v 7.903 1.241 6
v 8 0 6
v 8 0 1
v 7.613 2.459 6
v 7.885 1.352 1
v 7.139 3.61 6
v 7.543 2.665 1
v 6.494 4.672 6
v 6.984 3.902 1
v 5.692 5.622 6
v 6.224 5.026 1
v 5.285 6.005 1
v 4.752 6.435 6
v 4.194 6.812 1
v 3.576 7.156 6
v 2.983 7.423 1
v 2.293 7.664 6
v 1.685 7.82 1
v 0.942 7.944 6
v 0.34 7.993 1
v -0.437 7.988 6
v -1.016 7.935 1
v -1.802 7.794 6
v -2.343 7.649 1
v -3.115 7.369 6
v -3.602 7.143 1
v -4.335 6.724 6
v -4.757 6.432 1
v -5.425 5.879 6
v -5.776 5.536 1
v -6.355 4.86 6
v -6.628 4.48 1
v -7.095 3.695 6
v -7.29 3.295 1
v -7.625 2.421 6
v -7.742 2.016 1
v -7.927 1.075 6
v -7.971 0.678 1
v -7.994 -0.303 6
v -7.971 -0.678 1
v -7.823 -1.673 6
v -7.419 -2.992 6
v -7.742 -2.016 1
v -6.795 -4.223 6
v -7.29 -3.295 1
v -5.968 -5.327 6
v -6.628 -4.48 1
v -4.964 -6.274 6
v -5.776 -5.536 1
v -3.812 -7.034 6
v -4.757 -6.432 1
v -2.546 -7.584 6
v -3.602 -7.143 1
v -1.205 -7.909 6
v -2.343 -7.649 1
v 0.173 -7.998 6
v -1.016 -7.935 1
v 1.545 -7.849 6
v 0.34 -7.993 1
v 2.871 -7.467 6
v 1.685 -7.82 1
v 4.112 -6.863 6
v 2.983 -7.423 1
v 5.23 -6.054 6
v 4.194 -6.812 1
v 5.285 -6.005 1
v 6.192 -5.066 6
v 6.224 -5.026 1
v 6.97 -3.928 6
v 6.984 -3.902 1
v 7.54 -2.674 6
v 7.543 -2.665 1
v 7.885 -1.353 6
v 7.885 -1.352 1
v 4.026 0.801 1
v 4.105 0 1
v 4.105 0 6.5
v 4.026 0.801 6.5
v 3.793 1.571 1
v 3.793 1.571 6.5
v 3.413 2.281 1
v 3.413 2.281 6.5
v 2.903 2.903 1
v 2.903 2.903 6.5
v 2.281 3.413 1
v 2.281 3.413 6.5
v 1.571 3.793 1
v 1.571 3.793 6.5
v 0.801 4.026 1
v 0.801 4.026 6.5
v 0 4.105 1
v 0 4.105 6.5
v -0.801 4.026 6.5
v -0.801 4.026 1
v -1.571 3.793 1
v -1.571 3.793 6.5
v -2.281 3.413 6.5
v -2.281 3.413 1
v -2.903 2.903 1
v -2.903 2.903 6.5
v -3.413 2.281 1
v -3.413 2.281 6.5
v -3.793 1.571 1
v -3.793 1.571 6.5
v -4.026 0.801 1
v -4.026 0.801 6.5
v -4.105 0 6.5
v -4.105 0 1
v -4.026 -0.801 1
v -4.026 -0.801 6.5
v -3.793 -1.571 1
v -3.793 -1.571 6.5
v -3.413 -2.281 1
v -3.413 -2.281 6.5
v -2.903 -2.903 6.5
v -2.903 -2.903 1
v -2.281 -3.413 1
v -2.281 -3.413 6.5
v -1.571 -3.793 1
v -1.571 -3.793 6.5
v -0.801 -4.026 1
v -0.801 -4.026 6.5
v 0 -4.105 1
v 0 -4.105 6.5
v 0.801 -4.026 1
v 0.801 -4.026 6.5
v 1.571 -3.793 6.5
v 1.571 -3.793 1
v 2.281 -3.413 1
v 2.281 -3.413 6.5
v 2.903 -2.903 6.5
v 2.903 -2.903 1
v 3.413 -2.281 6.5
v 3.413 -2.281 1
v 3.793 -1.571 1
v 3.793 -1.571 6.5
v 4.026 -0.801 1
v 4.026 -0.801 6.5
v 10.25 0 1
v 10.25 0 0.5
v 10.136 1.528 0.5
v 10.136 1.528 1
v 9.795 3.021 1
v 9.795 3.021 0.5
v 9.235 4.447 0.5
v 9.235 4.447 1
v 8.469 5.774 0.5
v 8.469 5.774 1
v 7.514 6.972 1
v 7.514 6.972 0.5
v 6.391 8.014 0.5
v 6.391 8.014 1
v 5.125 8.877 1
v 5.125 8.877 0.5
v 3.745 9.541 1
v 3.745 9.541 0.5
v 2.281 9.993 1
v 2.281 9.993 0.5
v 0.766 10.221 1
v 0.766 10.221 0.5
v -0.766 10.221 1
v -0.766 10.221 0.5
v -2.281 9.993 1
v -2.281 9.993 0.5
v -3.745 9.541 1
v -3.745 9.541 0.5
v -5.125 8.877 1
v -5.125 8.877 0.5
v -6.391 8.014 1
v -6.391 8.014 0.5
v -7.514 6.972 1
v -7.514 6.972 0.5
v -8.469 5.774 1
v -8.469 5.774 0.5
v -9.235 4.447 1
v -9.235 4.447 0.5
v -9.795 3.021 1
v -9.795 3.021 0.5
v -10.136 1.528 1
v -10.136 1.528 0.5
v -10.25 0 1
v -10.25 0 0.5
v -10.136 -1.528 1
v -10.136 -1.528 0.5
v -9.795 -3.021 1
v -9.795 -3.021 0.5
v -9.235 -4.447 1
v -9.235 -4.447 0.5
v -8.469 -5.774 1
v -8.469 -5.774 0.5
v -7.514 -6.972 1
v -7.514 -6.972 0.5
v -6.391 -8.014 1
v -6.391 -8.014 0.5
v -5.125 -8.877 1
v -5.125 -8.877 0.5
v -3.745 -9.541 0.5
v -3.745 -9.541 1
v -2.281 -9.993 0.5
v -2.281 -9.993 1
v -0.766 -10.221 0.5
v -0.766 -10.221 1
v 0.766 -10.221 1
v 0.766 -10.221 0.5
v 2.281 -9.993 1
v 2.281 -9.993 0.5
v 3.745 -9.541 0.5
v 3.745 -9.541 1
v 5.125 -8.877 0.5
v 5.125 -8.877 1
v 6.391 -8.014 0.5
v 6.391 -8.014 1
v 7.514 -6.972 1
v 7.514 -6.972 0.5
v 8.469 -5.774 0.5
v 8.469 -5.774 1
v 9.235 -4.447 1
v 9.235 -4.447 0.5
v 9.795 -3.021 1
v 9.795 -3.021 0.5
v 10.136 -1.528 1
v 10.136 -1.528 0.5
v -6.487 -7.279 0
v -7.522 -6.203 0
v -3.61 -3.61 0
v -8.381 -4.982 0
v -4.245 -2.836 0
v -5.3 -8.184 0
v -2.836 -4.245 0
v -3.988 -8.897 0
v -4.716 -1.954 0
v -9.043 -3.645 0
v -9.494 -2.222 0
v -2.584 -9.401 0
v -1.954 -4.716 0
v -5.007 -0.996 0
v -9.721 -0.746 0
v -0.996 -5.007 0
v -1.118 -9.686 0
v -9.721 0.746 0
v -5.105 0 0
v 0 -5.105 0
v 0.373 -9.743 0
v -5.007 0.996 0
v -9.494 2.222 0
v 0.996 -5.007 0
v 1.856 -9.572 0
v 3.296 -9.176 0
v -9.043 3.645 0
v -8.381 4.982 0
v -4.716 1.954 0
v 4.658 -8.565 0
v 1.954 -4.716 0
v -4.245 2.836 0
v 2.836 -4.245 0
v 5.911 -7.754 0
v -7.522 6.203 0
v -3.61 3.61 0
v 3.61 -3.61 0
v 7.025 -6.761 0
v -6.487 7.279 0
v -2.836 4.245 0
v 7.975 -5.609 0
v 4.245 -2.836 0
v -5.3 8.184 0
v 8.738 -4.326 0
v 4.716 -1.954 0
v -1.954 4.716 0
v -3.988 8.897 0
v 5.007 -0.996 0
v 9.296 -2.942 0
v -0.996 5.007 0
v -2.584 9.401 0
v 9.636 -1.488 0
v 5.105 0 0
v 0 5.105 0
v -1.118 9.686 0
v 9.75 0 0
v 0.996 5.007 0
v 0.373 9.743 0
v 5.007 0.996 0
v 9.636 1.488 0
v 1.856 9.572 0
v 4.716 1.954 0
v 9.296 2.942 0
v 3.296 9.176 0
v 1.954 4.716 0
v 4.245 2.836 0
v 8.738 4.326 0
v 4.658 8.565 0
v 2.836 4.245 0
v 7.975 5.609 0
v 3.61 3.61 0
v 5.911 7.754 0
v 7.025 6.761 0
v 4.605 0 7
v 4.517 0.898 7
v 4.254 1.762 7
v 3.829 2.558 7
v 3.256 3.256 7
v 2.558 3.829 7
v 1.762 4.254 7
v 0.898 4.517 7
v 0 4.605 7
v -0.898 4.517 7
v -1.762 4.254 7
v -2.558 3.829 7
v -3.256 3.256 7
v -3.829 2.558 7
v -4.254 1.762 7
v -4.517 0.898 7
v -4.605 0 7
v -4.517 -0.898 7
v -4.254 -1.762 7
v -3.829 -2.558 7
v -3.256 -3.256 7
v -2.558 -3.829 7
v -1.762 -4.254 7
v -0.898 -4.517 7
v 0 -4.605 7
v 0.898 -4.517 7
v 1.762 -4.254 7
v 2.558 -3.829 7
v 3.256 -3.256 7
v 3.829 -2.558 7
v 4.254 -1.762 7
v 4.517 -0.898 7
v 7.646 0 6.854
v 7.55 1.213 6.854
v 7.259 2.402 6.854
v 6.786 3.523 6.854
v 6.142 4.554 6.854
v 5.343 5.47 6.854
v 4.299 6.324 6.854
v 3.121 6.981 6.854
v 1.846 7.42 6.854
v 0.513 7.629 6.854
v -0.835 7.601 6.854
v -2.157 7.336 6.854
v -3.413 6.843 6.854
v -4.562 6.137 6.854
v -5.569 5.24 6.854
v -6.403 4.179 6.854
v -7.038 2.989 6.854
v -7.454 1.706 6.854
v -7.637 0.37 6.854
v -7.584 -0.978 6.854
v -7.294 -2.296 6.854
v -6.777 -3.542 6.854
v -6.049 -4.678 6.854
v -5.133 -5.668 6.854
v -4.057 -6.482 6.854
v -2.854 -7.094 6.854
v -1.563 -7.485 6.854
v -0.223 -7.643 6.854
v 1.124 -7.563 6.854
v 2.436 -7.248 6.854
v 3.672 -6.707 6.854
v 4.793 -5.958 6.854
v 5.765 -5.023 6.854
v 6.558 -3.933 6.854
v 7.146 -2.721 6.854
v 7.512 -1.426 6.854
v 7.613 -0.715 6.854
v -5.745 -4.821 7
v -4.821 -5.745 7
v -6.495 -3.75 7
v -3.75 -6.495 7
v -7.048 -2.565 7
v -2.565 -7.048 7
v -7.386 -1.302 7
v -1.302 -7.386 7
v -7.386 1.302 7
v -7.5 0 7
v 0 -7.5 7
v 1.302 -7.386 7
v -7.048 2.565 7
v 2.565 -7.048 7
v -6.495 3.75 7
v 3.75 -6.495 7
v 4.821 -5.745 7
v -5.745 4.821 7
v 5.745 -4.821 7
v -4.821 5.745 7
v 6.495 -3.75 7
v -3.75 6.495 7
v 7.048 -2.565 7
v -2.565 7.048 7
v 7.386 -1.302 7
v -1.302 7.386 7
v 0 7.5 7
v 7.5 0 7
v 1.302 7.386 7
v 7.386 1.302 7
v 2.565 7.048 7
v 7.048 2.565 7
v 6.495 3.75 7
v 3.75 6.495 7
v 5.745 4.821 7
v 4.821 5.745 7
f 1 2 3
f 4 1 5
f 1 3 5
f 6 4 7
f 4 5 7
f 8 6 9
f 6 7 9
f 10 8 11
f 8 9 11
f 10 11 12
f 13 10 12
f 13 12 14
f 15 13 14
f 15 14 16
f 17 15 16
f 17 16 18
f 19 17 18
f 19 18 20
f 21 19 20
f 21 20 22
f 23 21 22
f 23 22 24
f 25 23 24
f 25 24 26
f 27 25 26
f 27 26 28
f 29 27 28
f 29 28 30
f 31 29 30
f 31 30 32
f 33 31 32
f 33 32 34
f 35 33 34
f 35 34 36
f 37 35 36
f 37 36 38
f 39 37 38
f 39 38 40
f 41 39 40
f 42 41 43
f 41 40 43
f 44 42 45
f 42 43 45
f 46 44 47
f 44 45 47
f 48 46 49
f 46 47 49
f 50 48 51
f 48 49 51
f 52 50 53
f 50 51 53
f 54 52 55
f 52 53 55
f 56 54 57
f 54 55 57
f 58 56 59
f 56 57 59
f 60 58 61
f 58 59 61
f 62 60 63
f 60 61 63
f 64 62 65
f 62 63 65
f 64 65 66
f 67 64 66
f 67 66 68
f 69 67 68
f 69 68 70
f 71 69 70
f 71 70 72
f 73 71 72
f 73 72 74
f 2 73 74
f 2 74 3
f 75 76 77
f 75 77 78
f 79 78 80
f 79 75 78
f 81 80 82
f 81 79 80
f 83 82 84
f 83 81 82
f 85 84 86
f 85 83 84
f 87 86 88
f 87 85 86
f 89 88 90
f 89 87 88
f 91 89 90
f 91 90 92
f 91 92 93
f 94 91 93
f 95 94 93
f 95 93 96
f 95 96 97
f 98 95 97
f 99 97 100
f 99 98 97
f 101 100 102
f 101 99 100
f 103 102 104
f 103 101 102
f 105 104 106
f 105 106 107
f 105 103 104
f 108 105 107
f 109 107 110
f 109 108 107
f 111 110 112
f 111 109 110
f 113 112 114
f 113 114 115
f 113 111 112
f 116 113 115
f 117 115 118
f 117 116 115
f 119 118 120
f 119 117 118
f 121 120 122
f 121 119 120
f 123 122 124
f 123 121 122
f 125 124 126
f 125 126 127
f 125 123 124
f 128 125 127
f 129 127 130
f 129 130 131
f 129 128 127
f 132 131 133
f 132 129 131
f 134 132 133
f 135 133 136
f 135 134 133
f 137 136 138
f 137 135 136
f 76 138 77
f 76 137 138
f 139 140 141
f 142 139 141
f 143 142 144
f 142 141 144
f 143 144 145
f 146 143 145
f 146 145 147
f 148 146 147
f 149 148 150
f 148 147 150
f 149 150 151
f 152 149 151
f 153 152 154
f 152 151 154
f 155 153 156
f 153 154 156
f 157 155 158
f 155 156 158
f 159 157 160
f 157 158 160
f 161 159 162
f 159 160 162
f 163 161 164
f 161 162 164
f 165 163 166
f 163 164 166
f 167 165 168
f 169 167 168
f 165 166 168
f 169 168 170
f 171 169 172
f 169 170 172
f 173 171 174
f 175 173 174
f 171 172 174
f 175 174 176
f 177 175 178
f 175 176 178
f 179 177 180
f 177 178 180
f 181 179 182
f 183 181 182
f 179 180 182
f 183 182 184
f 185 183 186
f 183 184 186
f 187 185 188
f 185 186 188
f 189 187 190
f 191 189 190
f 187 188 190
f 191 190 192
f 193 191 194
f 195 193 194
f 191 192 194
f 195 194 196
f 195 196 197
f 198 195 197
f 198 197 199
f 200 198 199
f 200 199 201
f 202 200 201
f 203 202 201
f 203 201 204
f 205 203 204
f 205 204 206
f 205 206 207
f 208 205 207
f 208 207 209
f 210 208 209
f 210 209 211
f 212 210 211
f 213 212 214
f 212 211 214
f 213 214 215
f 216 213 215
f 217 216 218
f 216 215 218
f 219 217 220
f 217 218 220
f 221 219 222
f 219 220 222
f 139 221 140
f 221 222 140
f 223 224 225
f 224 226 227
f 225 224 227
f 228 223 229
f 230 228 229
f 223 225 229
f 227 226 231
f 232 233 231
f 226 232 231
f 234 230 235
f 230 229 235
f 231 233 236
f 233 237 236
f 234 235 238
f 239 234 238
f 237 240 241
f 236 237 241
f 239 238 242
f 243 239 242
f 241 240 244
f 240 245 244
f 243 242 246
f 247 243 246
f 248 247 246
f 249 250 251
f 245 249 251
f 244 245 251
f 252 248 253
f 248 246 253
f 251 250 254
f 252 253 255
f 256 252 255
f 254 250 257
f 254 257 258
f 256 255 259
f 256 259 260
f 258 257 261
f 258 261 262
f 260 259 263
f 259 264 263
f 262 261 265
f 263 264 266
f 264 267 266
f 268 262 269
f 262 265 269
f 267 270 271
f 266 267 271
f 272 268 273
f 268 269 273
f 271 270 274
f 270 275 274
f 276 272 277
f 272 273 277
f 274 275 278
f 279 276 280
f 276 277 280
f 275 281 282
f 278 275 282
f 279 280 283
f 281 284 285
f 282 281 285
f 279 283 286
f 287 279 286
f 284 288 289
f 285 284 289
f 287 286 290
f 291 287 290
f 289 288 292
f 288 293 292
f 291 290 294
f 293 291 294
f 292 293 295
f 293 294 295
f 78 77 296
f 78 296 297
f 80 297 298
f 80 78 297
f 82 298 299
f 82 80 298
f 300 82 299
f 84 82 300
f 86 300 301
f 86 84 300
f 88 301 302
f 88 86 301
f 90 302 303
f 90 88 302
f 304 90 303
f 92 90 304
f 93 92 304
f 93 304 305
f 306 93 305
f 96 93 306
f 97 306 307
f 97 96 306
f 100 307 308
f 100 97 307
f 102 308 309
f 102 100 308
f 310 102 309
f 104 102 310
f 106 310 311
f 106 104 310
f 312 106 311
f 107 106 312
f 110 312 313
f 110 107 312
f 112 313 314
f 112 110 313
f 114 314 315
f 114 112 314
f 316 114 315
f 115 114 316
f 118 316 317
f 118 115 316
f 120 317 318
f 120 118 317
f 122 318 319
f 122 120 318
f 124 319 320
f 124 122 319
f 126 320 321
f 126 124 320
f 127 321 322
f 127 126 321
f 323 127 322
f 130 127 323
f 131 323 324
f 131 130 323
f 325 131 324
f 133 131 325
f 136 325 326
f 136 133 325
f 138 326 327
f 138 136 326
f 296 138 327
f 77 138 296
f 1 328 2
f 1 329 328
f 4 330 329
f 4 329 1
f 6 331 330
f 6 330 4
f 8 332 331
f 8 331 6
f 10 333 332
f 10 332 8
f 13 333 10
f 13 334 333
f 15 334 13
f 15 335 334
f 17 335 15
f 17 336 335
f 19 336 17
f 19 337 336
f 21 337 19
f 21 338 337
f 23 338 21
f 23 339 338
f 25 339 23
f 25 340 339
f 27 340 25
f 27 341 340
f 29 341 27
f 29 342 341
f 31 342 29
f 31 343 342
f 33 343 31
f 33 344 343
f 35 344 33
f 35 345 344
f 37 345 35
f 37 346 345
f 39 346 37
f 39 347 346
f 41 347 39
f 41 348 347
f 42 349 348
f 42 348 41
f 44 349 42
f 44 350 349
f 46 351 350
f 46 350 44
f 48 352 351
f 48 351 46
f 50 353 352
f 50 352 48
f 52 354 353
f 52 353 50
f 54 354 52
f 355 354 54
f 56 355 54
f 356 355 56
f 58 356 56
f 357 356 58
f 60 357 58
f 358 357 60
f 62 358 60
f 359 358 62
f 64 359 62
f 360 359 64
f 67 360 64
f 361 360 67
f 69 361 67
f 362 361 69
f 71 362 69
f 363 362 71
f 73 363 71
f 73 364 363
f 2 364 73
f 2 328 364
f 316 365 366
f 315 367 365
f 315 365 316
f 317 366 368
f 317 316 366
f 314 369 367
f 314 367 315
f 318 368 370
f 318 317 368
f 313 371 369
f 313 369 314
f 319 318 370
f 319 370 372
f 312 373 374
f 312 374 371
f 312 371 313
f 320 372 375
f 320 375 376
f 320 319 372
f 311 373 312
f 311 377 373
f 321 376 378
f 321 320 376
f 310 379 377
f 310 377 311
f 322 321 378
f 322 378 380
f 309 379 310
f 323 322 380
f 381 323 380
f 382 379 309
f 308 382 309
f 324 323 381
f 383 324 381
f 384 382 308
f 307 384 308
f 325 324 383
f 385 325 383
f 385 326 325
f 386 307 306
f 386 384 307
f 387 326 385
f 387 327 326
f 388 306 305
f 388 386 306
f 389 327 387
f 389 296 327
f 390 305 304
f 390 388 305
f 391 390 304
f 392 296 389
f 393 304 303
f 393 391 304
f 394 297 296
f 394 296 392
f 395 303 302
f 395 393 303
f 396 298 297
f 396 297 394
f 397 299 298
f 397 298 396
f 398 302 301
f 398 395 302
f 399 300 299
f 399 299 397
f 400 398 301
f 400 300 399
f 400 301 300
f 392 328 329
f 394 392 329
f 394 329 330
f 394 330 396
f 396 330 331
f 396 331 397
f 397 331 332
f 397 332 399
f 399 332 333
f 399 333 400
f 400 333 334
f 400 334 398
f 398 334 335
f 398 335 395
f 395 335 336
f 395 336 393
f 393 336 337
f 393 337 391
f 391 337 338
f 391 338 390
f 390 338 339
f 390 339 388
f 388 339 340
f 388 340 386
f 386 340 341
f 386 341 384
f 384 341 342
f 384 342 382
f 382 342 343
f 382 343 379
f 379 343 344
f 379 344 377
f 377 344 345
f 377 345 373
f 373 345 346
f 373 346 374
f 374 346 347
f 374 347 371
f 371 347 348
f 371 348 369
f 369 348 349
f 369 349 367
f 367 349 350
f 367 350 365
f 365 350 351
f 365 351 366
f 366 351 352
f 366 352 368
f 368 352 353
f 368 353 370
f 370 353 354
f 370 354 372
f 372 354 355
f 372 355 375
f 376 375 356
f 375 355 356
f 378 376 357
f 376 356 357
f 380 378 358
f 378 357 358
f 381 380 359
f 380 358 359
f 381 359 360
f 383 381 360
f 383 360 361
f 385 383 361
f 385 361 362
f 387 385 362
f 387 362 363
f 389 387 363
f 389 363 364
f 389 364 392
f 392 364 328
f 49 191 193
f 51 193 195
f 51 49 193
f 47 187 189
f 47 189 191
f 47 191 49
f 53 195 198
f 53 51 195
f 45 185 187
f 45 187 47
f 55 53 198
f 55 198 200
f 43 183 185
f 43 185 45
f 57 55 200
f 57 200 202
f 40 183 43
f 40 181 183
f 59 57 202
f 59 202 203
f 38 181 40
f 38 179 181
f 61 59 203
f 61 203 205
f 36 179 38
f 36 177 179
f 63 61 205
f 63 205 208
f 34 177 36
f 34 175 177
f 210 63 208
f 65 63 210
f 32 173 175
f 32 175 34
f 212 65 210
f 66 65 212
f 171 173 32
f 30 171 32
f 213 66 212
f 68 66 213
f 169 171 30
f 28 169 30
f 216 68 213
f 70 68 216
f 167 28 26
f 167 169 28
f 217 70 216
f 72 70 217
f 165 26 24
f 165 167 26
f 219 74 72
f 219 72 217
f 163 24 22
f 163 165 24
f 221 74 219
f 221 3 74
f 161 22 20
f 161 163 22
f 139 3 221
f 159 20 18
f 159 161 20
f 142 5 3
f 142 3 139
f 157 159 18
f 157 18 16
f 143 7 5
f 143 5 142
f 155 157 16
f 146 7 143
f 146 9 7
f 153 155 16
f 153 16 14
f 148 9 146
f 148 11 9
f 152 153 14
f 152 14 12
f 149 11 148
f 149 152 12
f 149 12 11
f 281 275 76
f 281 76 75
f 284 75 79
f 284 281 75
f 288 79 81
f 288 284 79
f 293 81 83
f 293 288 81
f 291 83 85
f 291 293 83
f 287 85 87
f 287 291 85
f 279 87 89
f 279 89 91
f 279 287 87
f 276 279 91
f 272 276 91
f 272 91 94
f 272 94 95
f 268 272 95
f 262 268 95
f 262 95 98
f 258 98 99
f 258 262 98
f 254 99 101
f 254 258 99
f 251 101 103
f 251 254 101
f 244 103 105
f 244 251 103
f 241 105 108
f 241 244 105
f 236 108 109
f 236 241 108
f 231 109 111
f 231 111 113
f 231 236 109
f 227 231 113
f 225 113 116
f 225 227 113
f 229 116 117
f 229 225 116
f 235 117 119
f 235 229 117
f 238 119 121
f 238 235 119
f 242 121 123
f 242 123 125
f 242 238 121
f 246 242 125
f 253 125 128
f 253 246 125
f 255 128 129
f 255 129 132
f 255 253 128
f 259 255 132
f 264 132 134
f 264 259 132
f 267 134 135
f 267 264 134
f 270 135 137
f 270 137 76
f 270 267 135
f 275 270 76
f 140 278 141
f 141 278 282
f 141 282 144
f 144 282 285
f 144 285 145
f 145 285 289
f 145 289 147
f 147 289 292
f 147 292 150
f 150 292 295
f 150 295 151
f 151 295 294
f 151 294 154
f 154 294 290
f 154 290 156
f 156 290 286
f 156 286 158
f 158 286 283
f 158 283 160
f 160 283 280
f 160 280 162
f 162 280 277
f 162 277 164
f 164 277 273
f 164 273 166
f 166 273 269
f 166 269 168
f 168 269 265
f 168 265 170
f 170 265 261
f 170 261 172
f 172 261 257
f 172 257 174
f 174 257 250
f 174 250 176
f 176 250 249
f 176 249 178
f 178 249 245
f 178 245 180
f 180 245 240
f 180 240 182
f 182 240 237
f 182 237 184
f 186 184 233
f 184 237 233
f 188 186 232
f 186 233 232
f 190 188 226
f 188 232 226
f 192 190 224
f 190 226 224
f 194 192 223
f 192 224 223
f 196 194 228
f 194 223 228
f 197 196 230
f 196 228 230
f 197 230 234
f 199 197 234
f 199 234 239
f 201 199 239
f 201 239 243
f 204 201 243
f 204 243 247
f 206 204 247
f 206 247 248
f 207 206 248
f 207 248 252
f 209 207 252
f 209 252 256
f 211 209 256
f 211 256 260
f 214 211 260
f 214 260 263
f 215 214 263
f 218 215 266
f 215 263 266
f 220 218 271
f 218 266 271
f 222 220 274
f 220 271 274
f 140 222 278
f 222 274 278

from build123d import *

# Parameters (mm, degrees)
F0_R     = 10.25
F0_R_2   = 8
F1_DEPTH = 1
F0_R_3   = 4.105
F2_DEPTH = 7
F3_SIZE  = 0.5
F4_SIZE  = 0.5
F5_SIZE  = 0.5
F6_SIZE  = 1


with BuildPart() as f1:
    # F0 (on Top) → F1 (new body)
    with BuildSketch(Plane.XY):
        Circle(F0_R)
        Circle(F0_R_2, mode=Mode.SUBTRACT)
    extrude(amount=F1_DEPTH)

    # F0 (on Top) → F2 (join)
    with BuildSketch(Plane.XY):
        Circle(F0_R_2)
        Circle(F0_R_3, mode=Mode.SUBTRACT)
    extrude(amount=F2_DEPTH)

    # F3
    f3_edges = [f1.edges().sort_by_distance(p)[0] for p in [
        (-10.25, 0, 0),
        (-4.105, 0, 7),
    ]]
    chamfer(f3_edges, length=F3_SIZE)

    # F4
    f4_edges = [f1.edges().sort_by_distance(p)[0] for p in [
        (-8, 0, 7),
    ]]
    chamfer(f4_edges, length=F4_SIZE)

    # F5
    f5_edges = [f1.edges().sort_by_distance(p)[0] for p in [
        (-8, 0, 6.5),
    ]]
    chamfer(f5_edges, length=F5_SIZE)

    # F6
    f6_edges = [f1.edges().sort_by_distance(p)[0] for p in [
        (-4.105, 0, 0),
    ]]
    chamfer(f6_edges, length=F6_SIZE)


solid = f1.part
